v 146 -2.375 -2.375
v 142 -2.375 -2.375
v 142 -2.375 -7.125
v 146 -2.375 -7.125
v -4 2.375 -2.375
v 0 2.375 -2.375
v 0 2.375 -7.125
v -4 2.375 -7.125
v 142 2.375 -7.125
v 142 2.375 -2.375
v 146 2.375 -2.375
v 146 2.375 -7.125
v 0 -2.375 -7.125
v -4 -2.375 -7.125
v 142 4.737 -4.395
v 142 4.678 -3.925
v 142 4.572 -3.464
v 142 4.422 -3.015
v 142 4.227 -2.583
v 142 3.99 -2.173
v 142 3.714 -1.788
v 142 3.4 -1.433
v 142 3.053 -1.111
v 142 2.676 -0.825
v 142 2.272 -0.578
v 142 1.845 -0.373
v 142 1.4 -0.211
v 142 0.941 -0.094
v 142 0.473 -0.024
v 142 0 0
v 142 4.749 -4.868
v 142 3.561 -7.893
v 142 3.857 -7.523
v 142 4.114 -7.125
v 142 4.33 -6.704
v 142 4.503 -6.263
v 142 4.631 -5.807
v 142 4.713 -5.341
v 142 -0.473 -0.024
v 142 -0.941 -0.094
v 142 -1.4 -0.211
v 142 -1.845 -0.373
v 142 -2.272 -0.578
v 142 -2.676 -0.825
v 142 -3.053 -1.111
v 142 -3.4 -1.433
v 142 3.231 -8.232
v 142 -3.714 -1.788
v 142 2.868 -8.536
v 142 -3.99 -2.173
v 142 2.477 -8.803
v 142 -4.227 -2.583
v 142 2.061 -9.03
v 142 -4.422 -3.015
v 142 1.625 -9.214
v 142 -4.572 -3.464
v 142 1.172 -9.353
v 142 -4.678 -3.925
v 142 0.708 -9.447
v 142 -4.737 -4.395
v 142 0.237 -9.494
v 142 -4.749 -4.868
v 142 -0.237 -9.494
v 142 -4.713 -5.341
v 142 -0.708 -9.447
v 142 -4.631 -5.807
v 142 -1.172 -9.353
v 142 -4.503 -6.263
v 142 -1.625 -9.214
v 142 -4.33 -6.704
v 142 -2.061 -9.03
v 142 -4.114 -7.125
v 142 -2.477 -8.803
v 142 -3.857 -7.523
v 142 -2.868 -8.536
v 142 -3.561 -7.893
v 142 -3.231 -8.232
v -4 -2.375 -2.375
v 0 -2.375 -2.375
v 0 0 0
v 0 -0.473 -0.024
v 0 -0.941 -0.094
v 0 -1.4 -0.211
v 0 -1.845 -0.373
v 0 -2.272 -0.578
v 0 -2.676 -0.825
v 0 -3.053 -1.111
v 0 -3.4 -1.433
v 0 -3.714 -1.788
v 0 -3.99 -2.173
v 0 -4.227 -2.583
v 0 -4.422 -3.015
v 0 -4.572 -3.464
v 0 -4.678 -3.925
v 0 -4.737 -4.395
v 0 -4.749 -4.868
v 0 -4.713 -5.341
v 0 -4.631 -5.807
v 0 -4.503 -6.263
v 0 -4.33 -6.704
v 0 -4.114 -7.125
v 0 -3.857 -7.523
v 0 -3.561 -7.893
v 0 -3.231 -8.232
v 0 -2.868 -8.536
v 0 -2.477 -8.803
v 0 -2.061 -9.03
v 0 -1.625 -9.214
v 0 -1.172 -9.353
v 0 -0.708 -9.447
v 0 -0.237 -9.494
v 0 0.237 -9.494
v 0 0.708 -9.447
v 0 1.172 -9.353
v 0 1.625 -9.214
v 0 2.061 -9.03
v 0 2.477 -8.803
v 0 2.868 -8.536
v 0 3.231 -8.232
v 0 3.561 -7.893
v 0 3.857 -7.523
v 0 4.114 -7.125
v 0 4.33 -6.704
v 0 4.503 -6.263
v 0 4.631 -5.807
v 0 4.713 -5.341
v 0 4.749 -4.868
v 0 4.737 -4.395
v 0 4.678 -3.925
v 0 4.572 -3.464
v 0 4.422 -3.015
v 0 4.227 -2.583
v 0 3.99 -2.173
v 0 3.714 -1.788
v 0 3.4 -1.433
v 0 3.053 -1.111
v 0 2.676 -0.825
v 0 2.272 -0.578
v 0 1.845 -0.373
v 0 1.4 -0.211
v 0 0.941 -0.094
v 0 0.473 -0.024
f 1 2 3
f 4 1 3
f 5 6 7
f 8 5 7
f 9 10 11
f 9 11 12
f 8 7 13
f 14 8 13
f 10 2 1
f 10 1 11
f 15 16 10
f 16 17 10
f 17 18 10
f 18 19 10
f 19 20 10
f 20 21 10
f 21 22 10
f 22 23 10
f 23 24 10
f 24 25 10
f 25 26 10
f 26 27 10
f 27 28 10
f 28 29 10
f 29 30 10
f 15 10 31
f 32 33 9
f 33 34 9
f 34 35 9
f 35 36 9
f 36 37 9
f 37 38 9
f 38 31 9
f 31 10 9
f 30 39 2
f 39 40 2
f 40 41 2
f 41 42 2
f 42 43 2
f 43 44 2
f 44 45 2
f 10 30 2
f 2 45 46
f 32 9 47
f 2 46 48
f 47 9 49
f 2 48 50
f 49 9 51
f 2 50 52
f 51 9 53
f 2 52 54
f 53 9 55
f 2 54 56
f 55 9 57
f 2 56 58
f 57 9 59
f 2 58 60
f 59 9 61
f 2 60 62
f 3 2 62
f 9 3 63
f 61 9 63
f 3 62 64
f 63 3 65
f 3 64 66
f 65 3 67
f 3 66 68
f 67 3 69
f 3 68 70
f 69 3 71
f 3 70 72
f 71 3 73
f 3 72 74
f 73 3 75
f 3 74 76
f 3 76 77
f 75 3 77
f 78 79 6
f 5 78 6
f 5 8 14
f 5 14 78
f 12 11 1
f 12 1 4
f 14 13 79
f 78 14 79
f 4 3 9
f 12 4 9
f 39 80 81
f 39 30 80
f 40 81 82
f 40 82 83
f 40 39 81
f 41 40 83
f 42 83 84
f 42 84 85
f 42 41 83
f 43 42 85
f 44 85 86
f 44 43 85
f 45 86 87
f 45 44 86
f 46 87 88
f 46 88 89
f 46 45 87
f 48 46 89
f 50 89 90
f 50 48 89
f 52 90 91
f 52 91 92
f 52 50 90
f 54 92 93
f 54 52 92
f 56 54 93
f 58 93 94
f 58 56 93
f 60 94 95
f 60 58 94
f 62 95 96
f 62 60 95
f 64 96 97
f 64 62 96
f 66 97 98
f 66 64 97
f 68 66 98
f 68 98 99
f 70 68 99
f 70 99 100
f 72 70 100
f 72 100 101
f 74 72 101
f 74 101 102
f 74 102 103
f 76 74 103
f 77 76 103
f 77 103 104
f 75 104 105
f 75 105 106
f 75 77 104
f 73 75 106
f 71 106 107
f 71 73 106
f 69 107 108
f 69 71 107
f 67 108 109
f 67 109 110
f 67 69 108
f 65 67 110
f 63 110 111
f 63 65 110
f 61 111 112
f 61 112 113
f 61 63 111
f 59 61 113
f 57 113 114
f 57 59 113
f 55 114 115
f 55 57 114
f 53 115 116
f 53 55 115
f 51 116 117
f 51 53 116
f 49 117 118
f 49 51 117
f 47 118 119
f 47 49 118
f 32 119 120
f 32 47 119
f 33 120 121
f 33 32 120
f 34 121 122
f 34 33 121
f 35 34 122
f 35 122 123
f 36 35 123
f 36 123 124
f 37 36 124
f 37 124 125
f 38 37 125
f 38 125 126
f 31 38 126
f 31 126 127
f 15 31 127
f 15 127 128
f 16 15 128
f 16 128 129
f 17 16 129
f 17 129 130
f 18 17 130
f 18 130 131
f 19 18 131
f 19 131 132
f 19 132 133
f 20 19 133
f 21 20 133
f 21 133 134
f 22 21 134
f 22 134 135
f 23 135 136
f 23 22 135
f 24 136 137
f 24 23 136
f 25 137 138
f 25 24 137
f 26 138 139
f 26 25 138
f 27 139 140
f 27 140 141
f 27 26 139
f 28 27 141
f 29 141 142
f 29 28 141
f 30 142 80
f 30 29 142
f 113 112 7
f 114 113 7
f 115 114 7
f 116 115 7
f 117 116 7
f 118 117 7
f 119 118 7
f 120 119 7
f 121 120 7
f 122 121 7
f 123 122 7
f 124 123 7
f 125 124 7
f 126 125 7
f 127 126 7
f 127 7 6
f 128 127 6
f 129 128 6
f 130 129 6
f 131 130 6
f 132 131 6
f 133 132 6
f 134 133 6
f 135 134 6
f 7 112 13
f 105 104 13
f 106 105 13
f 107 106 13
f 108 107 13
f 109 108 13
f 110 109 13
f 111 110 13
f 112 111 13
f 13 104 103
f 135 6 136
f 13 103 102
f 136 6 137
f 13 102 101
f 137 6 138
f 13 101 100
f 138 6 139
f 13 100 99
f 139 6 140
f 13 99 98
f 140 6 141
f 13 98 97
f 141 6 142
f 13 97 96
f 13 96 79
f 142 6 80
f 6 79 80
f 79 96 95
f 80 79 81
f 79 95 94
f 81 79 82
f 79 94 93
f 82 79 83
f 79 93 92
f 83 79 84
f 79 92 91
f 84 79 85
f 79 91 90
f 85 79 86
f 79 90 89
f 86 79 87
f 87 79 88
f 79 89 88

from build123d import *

# Parameters (mm, degrees)
ESQUISSE5_W        = 4.75
ESQUISSE5_H        = 4.75
BOSS_EXTRU_3_DEPTH = 4
BOSS_EXTRU_4_DEPTH = 4


with BuildPart() as part:
    # Esquisse1 → Révolution1 (revolve)
    with BuildSketch(Plane(origin=(0, 0, 0), x_dir=(1, 0, 0), z_dir=(0, 1, 0))):
        Polygon((0, 0), (0, 4.75), (142, 4.75), (142, 0), (125.25, 0), (117.25, 0), (24.75, 0), (16.75, 0), align=None)
    revolve(axis=Axis((0, 0, -4.75), (1, 0, 0)))

    # Esquisse5 → Boss.-Extru.3 (add)
    with BuildSketch(Plane(origin=(142, 0, 0), x_dir=(0, 0, -1), z_dir=(1, 0, 0))):
        with Locations((4.75, 0)):
            Rectangle(ESQUISSE5_W, ESQUISSE5_H)
    extrude(amount=BOSS_EXTRU_3_DEPTH)

    # Esquisse6 → Boss.-Extru.4 (add)
    with BuildSketch(Plane.ZY):
        Polygon((-4.75, 2.375), (-7.125, 2.375), (-7.125, -2.375), (-2.375, -2.375), (-2.375, 2.375), align=None)
    extrude(amount=BOSS_EXTRU_4_DEPTH)


solid = part.part
